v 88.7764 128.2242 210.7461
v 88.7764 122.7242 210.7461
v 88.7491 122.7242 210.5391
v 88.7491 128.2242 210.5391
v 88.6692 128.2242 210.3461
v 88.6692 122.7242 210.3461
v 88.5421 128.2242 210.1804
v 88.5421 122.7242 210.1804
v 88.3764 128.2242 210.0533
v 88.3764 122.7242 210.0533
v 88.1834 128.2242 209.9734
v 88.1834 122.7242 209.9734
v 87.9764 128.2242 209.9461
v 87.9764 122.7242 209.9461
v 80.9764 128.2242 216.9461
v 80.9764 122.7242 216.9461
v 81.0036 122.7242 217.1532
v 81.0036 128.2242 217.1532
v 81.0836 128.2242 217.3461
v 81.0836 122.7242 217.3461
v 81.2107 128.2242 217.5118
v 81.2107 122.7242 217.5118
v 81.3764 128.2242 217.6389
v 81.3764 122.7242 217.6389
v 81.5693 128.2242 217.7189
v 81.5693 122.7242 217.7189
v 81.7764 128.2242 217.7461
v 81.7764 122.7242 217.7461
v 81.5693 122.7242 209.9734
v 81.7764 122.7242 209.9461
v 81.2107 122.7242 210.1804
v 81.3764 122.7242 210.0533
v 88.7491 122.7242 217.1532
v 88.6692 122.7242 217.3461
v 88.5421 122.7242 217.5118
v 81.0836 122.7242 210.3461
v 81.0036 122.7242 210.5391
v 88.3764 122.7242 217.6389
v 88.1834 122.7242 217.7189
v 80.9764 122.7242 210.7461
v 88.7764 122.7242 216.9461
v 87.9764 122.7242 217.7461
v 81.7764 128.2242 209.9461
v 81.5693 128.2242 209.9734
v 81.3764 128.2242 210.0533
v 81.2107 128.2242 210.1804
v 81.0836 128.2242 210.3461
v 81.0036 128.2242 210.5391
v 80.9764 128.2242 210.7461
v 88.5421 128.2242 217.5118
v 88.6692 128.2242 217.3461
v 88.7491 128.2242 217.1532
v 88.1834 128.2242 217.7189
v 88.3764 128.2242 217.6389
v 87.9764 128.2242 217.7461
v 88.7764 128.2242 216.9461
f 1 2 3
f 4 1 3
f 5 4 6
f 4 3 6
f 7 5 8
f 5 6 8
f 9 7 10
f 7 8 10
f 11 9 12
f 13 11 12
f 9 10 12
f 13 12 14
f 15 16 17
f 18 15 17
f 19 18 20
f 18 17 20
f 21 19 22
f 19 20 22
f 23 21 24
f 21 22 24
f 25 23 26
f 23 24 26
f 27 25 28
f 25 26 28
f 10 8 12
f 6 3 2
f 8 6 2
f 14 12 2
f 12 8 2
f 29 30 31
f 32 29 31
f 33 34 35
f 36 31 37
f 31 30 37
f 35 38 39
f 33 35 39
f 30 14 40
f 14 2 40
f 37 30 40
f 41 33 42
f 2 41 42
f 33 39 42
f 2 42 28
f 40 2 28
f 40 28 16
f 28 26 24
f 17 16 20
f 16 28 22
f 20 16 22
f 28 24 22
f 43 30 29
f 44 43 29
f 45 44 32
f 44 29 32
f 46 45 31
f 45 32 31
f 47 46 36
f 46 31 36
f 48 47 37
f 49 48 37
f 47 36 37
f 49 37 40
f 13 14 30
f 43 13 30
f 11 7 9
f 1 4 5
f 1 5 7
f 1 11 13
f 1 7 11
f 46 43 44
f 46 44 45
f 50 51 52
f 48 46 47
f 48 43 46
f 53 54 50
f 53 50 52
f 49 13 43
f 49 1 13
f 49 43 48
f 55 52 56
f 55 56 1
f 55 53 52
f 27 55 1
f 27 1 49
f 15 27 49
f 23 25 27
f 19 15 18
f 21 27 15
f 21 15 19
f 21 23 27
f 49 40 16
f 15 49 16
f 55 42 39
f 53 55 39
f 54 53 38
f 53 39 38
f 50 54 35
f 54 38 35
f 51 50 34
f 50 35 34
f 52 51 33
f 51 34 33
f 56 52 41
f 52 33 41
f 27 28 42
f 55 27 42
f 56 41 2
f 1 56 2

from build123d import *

# Parameters (mm, degrees)
BOSS_EXTRUDE1_START = 1
BOSS_EXTRUDE1_DEPTH = 5.5


with BuildPart() as part:
    # Sketch1 → Boss-Extrude1 (new body)
    with BuildSketch(Plane.XZ.offset(-123.724152422).offset(BOSS_EXTRUDE1_START)):
        with BuildLine():
            Line((80.976379089, 210.746126643), (80.976379089, 216.946126643))
            ThreePointArc((80.976379089, 216.946126643), (81.210693664, 217.511812068), (81.776379089, 217.746126643))
            Line((81.776379089, 217.746126643), (87.976379089, 217.746126643))
            ThreePointArc((87.976379089, 217.746126643), (88.542064514, 217.511812068), (88.776379089, 216.946126643))
            Line((88.776379089, 216.946126643), (88.776379089, 210.746126643))
            ThreePointArc((88.776379089, 210.746126643), (88.542064514, 210.180441218), (87.976379089, 209.946126643))
            Line((87.976379089, 209.946126643), (81.776379089, 209.946126643))
            ThreePointArc((81.776379089, 209.946126643), (81.210693664, 210.180441218), (80.976379089, 210.746126643))
        make_face()
    extrude(amount=-BOSS_EXTRUDE1_DEPTH)


solid = part.part
